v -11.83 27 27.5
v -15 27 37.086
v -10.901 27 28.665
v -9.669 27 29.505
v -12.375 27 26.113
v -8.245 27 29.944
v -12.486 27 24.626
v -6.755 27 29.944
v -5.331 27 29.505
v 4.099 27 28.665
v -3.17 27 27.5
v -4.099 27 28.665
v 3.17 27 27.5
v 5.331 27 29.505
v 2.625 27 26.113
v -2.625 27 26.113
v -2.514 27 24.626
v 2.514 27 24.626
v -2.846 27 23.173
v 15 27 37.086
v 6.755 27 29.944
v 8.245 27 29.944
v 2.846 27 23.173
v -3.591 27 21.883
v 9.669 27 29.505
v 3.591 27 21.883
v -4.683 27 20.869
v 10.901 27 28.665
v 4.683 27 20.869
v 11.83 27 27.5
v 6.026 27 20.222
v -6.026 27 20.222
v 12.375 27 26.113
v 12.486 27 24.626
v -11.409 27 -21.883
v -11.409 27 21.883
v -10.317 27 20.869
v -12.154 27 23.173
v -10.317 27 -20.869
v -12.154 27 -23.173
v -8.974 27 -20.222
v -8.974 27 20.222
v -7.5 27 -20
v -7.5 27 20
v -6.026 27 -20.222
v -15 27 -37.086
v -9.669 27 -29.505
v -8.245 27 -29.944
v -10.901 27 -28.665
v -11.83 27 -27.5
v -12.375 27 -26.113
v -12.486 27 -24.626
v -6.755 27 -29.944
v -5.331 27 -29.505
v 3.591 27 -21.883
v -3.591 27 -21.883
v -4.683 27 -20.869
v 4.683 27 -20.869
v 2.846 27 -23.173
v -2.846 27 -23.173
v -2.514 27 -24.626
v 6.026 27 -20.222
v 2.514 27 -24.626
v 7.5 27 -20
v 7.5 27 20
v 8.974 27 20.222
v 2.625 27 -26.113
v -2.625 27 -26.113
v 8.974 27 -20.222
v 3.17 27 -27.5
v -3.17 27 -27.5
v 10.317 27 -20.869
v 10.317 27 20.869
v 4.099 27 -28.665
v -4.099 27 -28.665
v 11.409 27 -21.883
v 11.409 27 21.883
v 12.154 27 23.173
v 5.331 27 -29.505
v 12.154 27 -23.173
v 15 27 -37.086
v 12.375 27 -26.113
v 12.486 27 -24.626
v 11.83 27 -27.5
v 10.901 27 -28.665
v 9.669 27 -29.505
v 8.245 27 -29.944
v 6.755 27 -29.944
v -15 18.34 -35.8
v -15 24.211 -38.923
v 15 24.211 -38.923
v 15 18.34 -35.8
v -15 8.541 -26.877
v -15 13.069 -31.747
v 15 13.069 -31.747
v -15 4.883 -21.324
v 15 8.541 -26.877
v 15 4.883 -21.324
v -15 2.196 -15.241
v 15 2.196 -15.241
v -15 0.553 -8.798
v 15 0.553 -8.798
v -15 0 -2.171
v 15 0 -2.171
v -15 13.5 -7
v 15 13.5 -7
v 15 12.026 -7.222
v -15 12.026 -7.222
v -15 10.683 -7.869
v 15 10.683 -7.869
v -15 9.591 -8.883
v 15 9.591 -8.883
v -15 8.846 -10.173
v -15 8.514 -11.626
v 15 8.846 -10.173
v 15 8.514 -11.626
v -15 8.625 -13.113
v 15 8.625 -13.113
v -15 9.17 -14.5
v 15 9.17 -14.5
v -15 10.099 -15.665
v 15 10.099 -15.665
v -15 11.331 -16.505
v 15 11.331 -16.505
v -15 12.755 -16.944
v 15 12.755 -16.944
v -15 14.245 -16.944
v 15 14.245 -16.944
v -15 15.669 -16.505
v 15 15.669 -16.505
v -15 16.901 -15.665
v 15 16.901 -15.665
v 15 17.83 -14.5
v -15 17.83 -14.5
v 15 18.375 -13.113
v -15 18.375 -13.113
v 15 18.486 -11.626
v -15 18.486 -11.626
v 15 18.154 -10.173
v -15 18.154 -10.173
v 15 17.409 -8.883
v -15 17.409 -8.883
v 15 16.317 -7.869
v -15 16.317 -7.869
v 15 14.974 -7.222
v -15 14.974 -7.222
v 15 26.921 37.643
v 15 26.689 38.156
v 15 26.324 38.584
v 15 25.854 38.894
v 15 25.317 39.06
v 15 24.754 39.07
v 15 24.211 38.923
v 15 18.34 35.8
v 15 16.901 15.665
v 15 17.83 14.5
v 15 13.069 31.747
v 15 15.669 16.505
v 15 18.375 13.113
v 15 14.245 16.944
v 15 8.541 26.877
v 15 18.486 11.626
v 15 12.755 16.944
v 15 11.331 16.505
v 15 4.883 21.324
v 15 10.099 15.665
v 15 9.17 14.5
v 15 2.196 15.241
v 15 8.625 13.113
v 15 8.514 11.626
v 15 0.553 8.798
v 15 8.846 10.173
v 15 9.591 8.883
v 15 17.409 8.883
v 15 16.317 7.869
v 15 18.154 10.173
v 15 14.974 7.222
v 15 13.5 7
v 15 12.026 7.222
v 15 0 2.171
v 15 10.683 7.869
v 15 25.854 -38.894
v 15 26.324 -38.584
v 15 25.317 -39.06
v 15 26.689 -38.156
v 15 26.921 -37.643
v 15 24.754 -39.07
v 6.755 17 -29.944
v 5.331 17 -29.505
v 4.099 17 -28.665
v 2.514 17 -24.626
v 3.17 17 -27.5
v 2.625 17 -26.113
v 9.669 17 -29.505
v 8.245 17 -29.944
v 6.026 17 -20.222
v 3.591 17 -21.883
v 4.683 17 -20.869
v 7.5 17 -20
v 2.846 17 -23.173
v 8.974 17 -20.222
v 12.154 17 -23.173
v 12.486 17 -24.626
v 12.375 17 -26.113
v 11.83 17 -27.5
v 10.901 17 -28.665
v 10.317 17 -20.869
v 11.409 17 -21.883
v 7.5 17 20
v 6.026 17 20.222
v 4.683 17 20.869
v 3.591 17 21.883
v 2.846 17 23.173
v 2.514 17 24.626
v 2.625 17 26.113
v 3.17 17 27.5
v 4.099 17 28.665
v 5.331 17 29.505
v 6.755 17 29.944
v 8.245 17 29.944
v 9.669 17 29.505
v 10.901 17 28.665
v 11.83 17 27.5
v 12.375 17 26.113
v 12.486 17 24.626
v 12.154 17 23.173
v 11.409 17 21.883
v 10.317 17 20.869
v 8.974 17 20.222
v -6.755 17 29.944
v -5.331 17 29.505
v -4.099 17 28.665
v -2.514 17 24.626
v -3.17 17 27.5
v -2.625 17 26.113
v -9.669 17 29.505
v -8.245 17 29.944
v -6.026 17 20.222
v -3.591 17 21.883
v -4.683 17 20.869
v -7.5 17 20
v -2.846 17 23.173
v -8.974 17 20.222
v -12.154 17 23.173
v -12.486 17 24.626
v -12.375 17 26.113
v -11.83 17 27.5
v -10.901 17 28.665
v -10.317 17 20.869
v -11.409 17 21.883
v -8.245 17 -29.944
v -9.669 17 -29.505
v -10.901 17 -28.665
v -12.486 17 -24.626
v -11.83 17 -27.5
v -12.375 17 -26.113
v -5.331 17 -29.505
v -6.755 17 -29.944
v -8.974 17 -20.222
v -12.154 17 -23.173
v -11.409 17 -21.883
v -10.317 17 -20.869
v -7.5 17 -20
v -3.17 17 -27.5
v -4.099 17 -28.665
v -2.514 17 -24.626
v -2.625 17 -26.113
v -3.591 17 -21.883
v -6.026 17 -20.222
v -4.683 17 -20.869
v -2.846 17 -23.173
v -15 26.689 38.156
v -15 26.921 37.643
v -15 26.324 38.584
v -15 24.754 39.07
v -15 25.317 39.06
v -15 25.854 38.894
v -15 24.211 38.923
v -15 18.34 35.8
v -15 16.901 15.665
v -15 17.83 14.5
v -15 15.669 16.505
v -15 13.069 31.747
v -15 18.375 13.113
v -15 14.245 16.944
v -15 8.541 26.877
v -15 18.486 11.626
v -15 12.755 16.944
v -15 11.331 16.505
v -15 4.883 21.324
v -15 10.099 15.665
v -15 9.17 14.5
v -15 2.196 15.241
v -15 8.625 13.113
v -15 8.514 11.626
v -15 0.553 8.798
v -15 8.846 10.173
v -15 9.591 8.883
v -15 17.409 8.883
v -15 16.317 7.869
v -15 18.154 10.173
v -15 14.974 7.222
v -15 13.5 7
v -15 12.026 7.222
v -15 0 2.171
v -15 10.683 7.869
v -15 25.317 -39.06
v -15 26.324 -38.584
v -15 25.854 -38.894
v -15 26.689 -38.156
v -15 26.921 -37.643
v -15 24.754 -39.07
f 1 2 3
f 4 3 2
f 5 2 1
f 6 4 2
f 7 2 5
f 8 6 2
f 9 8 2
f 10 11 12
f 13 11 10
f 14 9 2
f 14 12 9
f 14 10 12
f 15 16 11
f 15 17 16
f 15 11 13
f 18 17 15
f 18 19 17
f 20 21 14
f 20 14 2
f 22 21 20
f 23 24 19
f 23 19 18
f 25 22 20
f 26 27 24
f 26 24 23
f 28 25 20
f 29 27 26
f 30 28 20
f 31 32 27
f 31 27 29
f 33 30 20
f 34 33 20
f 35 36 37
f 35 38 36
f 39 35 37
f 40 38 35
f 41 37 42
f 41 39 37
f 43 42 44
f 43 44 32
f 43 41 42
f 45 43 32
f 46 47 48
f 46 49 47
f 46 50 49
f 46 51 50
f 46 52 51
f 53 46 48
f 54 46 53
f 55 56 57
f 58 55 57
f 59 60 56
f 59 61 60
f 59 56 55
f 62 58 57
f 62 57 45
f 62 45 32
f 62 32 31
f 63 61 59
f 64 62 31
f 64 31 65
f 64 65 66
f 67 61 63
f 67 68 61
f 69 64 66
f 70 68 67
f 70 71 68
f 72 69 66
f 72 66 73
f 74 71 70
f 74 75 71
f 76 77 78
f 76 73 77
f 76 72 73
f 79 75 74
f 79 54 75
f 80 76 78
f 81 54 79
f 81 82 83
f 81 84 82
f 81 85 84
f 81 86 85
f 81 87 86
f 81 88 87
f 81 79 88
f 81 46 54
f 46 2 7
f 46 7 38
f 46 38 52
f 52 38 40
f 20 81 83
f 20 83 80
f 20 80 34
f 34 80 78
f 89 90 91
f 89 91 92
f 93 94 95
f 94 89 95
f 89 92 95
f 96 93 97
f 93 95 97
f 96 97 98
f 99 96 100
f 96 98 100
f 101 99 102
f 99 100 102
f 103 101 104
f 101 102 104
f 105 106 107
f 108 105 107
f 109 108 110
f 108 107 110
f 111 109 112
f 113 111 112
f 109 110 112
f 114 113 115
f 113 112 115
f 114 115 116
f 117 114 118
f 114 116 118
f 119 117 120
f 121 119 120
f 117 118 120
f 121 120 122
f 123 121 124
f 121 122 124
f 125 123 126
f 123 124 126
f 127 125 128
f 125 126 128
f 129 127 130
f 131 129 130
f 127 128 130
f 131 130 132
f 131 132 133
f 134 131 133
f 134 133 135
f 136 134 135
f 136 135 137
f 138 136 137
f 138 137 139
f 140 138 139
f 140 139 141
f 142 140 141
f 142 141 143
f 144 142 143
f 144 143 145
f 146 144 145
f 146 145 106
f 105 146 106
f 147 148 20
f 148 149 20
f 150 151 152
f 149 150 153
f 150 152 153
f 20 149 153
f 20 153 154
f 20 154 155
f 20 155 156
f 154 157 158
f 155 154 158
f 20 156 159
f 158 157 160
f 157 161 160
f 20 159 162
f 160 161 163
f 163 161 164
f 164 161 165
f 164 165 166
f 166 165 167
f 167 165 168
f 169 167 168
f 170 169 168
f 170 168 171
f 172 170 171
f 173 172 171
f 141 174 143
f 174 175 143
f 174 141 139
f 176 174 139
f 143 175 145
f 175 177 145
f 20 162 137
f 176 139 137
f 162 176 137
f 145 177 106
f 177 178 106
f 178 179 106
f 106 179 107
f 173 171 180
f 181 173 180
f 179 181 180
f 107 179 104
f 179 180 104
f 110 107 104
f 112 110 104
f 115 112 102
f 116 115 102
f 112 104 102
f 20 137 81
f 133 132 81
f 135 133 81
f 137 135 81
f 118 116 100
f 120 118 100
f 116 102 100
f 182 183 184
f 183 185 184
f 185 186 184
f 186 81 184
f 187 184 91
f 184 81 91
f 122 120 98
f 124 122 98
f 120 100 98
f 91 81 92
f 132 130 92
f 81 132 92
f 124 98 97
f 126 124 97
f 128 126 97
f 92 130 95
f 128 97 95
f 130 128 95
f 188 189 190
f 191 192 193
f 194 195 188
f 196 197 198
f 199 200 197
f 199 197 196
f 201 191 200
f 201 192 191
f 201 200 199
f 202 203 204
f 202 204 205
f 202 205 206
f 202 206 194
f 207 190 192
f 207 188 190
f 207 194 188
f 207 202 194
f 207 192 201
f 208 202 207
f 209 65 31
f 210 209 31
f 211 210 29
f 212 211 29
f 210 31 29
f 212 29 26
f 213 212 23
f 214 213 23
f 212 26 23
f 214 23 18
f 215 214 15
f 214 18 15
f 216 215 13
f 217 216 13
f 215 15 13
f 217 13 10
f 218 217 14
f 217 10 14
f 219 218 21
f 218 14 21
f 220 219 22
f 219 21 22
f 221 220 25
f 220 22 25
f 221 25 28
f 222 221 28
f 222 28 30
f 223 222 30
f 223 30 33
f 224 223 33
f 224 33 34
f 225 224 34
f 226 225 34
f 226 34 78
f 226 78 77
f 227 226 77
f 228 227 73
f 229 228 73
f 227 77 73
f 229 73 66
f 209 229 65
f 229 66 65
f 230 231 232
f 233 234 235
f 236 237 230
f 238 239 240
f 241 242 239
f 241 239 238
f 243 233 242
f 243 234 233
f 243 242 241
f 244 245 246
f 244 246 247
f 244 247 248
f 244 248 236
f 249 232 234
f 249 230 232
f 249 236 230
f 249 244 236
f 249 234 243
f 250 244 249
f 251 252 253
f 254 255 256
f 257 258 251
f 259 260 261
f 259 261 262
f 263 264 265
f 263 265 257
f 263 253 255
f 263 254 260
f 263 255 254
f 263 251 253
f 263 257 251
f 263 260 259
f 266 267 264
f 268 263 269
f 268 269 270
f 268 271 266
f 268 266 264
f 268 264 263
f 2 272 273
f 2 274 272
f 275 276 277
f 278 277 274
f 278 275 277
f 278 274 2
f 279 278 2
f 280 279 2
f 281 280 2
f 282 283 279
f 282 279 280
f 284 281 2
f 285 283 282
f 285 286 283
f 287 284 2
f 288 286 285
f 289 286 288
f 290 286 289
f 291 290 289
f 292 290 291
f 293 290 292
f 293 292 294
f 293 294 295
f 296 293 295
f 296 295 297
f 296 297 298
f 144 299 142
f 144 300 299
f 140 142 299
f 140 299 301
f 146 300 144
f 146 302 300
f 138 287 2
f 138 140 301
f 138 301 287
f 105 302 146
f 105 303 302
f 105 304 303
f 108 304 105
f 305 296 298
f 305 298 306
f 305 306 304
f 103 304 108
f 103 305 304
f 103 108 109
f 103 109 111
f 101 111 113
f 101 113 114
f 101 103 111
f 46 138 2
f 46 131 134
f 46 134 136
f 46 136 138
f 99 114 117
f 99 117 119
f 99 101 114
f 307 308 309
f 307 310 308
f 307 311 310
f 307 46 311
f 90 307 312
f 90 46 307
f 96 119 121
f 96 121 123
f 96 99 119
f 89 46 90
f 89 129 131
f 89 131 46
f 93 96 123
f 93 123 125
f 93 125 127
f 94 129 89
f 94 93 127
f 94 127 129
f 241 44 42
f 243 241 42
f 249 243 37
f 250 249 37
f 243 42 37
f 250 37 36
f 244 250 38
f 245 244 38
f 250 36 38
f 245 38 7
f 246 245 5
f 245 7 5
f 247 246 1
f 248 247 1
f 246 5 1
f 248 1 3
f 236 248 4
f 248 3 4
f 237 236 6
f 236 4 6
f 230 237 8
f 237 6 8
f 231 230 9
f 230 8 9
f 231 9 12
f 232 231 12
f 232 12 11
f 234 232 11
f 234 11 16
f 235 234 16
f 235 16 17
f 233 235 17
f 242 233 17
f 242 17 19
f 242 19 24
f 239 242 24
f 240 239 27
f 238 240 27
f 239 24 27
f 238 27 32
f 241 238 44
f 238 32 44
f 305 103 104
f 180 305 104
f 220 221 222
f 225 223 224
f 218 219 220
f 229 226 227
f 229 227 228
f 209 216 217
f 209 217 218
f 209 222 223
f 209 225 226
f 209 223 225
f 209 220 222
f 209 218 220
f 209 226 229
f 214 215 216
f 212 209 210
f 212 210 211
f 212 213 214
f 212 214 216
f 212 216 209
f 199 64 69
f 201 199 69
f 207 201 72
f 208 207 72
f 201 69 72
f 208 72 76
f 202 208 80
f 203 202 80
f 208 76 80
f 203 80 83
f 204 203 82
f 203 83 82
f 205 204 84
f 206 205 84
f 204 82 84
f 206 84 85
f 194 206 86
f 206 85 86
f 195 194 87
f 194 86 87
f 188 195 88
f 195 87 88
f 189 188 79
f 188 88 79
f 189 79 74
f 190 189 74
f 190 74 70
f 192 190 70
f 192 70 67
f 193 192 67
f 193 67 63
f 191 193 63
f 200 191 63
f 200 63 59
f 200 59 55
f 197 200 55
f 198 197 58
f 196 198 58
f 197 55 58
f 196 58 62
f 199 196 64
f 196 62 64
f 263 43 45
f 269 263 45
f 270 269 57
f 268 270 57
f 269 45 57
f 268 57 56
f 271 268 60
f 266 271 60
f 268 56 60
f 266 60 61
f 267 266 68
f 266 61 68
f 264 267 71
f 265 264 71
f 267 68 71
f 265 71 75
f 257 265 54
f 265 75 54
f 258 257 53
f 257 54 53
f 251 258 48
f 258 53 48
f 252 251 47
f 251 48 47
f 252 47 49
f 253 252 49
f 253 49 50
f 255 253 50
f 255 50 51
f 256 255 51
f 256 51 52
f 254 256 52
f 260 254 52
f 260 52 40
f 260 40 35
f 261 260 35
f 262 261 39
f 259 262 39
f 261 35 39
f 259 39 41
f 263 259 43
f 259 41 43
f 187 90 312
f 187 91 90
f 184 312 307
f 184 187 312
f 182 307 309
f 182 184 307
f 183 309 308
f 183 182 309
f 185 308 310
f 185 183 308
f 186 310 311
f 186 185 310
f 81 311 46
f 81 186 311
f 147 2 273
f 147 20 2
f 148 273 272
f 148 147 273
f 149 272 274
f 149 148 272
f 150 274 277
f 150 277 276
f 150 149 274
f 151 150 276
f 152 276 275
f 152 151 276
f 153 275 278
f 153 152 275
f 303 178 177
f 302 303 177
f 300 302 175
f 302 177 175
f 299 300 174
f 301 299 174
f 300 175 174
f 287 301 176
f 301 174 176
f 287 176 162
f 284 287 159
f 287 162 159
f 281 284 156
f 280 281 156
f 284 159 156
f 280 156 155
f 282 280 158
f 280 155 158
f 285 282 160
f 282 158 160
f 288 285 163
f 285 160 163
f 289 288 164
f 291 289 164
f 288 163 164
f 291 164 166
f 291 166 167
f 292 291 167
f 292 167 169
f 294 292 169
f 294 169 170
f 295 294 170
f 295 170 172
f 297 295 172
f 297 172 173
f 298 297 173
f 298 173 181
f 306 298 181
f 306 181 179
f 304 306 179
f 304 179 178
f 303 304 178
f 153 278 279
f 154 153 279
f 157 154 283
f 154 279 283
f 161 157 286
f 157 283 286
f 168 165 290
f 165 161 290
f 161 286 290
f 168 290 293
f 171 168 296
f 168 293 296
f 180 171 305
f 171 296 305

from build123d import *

# Parameters (mm, degrees)
SKETCH1_W           = 30
SKETCH1_H           = 80
BOSS_EXTRUDE1_DEPTH = 27
SKETCH2_R           = 5
CUT_EXTRUDE1_DEPTH  = 40
FILLET5_R           = 40
FILLET6_R           = 40
FILLET7_R           = 2
FILLET8_R           = 2
SKETCH6_R           = 5
CUT_EXTRUDE3_DEPTH  = 10


with BuildPart() as part:
    # Sketch1 → Boss-Extrude1 (new body)
    with BuildSketch(Plane(origin=(0, 0, 0), x_dir=(1, 0, 0), z_dir=(0, 1, 0))):
        Rectangle(SKETCH1_W, SKETCH1_H)
    extrude(amount=BOSS_EXTRUDE1_DEPTH)

    # Sketch2 → Cut-Extrude1 (cut)
    with BuildSketch(Plane(origin=(15, 0, 0), x_dir=(0, 0, -1), z_dir=(1, 0, 0))):
        with Locations((-12, 13.5)):
            Circle(SKETCH2_R)
        with Locations(Location((12, 13.5, 0), (0, 0, 180))):
            Circle(SKETCH2_R)
    extrude(amount=-CUT_EXTRUDE1_DEPTH, mode=Mode.SUBTRACT)

    # Fillet5
    # the kernel refuses this fillet: 40 mm, written as the material it takes off along each edge
    with BuildSketch(Plane(origin=(109.571401597, 0, -40), x_dir=(0, 0, 1), z_dir=(-1, 0, 0))) as fillet5_piece_1:
        with BuildLine():
            CenterArc((37.828560639, 40), FILLET5_R, 198.965574989, 71.034425011)
            Line((0, 27), (-0.756571213, 26.74))
            ThreePointArc((-0.756571213, 26.74), (-0.8, 13.5), (-0.8, 0))
            Line((-0.8, 0), (0, -0.8))
            Line((0, -0.8), (37.828560639, -0.8))
            Line((37.828560639, -0.8), (37.828560639, 0))
        make_face()
    extrude(amount=219.142803194, mode=Mode.SUBTRACT)

    # Fillet6
    # the kernel refuses this fillet: 40 mm, written as the material it takes off along each edge
    with BuildSketch(Plane(origin=(-109.571401597, 0, 40), x_dir=(0, 1, 0), z_dir=(1, 0, 0))) as fillet6_piece_1:
        with BuildLine():
            CenterArc((40, -37.828560639), FILLET6_R, 108.965574989, 71.034425011)
            Line((0, -37.828560639), (-0.8, -37.828560639))
            Line((-0.8, -37.828560639), (-0.8, 0))
            Line((-0.8, 0), (0, 0.8))
            ThreePointArc((0, 0.8), (13.5, 0.8), (26.74, 0.756571213))
            Line((26.74, 0.756571213), (27, 0))
        make_face()
    extrude(amount=219.142803194, mode=Mode.SUBTRACT)

    # Fillet7
    fillet7_edges = [part.edges().sort_by_distance(p)[0] for p in [
        (0, 27, -40),
    ]]
    fillet(fillet7_edges, radius=FILLET7_R)

    # Fillet8
    fillet8_edges = [part.edges().sort_by_distance(p)[0] for p in [
        (0, 27, 40),
    ]]
    fillet(fillet8_edges, radius=FILLET8_R)

    # Sketch6 → Cut-Extrude3 (cut)
    with BuildSketch(Plane(origin=(0, 27, 0), x_dir=(1, 0, 0), z_dir=(0, 1, 0))):
        with Locations(Location((-7.5, 25, 0), (0, 0, 270))):
            Circle(SKETCH6_R)
        with Locations(Location((7.5, 25, 0), (0, 0, 270))):
            Circle(SKETCH6_R)
        with Locations(Location((7.5, -25, 0), (0, 0, 90))):
            Circle(SKETCH6_R)
        with Locations(Location((-7.5, -25, 0), (0, 0, 90))):
            Circle(SKETCH6_R)
    extrude(amount=-CUT_EXTRUDE3_DEPTH, mode=Mode.SUBTRACT)


solid = part.part
